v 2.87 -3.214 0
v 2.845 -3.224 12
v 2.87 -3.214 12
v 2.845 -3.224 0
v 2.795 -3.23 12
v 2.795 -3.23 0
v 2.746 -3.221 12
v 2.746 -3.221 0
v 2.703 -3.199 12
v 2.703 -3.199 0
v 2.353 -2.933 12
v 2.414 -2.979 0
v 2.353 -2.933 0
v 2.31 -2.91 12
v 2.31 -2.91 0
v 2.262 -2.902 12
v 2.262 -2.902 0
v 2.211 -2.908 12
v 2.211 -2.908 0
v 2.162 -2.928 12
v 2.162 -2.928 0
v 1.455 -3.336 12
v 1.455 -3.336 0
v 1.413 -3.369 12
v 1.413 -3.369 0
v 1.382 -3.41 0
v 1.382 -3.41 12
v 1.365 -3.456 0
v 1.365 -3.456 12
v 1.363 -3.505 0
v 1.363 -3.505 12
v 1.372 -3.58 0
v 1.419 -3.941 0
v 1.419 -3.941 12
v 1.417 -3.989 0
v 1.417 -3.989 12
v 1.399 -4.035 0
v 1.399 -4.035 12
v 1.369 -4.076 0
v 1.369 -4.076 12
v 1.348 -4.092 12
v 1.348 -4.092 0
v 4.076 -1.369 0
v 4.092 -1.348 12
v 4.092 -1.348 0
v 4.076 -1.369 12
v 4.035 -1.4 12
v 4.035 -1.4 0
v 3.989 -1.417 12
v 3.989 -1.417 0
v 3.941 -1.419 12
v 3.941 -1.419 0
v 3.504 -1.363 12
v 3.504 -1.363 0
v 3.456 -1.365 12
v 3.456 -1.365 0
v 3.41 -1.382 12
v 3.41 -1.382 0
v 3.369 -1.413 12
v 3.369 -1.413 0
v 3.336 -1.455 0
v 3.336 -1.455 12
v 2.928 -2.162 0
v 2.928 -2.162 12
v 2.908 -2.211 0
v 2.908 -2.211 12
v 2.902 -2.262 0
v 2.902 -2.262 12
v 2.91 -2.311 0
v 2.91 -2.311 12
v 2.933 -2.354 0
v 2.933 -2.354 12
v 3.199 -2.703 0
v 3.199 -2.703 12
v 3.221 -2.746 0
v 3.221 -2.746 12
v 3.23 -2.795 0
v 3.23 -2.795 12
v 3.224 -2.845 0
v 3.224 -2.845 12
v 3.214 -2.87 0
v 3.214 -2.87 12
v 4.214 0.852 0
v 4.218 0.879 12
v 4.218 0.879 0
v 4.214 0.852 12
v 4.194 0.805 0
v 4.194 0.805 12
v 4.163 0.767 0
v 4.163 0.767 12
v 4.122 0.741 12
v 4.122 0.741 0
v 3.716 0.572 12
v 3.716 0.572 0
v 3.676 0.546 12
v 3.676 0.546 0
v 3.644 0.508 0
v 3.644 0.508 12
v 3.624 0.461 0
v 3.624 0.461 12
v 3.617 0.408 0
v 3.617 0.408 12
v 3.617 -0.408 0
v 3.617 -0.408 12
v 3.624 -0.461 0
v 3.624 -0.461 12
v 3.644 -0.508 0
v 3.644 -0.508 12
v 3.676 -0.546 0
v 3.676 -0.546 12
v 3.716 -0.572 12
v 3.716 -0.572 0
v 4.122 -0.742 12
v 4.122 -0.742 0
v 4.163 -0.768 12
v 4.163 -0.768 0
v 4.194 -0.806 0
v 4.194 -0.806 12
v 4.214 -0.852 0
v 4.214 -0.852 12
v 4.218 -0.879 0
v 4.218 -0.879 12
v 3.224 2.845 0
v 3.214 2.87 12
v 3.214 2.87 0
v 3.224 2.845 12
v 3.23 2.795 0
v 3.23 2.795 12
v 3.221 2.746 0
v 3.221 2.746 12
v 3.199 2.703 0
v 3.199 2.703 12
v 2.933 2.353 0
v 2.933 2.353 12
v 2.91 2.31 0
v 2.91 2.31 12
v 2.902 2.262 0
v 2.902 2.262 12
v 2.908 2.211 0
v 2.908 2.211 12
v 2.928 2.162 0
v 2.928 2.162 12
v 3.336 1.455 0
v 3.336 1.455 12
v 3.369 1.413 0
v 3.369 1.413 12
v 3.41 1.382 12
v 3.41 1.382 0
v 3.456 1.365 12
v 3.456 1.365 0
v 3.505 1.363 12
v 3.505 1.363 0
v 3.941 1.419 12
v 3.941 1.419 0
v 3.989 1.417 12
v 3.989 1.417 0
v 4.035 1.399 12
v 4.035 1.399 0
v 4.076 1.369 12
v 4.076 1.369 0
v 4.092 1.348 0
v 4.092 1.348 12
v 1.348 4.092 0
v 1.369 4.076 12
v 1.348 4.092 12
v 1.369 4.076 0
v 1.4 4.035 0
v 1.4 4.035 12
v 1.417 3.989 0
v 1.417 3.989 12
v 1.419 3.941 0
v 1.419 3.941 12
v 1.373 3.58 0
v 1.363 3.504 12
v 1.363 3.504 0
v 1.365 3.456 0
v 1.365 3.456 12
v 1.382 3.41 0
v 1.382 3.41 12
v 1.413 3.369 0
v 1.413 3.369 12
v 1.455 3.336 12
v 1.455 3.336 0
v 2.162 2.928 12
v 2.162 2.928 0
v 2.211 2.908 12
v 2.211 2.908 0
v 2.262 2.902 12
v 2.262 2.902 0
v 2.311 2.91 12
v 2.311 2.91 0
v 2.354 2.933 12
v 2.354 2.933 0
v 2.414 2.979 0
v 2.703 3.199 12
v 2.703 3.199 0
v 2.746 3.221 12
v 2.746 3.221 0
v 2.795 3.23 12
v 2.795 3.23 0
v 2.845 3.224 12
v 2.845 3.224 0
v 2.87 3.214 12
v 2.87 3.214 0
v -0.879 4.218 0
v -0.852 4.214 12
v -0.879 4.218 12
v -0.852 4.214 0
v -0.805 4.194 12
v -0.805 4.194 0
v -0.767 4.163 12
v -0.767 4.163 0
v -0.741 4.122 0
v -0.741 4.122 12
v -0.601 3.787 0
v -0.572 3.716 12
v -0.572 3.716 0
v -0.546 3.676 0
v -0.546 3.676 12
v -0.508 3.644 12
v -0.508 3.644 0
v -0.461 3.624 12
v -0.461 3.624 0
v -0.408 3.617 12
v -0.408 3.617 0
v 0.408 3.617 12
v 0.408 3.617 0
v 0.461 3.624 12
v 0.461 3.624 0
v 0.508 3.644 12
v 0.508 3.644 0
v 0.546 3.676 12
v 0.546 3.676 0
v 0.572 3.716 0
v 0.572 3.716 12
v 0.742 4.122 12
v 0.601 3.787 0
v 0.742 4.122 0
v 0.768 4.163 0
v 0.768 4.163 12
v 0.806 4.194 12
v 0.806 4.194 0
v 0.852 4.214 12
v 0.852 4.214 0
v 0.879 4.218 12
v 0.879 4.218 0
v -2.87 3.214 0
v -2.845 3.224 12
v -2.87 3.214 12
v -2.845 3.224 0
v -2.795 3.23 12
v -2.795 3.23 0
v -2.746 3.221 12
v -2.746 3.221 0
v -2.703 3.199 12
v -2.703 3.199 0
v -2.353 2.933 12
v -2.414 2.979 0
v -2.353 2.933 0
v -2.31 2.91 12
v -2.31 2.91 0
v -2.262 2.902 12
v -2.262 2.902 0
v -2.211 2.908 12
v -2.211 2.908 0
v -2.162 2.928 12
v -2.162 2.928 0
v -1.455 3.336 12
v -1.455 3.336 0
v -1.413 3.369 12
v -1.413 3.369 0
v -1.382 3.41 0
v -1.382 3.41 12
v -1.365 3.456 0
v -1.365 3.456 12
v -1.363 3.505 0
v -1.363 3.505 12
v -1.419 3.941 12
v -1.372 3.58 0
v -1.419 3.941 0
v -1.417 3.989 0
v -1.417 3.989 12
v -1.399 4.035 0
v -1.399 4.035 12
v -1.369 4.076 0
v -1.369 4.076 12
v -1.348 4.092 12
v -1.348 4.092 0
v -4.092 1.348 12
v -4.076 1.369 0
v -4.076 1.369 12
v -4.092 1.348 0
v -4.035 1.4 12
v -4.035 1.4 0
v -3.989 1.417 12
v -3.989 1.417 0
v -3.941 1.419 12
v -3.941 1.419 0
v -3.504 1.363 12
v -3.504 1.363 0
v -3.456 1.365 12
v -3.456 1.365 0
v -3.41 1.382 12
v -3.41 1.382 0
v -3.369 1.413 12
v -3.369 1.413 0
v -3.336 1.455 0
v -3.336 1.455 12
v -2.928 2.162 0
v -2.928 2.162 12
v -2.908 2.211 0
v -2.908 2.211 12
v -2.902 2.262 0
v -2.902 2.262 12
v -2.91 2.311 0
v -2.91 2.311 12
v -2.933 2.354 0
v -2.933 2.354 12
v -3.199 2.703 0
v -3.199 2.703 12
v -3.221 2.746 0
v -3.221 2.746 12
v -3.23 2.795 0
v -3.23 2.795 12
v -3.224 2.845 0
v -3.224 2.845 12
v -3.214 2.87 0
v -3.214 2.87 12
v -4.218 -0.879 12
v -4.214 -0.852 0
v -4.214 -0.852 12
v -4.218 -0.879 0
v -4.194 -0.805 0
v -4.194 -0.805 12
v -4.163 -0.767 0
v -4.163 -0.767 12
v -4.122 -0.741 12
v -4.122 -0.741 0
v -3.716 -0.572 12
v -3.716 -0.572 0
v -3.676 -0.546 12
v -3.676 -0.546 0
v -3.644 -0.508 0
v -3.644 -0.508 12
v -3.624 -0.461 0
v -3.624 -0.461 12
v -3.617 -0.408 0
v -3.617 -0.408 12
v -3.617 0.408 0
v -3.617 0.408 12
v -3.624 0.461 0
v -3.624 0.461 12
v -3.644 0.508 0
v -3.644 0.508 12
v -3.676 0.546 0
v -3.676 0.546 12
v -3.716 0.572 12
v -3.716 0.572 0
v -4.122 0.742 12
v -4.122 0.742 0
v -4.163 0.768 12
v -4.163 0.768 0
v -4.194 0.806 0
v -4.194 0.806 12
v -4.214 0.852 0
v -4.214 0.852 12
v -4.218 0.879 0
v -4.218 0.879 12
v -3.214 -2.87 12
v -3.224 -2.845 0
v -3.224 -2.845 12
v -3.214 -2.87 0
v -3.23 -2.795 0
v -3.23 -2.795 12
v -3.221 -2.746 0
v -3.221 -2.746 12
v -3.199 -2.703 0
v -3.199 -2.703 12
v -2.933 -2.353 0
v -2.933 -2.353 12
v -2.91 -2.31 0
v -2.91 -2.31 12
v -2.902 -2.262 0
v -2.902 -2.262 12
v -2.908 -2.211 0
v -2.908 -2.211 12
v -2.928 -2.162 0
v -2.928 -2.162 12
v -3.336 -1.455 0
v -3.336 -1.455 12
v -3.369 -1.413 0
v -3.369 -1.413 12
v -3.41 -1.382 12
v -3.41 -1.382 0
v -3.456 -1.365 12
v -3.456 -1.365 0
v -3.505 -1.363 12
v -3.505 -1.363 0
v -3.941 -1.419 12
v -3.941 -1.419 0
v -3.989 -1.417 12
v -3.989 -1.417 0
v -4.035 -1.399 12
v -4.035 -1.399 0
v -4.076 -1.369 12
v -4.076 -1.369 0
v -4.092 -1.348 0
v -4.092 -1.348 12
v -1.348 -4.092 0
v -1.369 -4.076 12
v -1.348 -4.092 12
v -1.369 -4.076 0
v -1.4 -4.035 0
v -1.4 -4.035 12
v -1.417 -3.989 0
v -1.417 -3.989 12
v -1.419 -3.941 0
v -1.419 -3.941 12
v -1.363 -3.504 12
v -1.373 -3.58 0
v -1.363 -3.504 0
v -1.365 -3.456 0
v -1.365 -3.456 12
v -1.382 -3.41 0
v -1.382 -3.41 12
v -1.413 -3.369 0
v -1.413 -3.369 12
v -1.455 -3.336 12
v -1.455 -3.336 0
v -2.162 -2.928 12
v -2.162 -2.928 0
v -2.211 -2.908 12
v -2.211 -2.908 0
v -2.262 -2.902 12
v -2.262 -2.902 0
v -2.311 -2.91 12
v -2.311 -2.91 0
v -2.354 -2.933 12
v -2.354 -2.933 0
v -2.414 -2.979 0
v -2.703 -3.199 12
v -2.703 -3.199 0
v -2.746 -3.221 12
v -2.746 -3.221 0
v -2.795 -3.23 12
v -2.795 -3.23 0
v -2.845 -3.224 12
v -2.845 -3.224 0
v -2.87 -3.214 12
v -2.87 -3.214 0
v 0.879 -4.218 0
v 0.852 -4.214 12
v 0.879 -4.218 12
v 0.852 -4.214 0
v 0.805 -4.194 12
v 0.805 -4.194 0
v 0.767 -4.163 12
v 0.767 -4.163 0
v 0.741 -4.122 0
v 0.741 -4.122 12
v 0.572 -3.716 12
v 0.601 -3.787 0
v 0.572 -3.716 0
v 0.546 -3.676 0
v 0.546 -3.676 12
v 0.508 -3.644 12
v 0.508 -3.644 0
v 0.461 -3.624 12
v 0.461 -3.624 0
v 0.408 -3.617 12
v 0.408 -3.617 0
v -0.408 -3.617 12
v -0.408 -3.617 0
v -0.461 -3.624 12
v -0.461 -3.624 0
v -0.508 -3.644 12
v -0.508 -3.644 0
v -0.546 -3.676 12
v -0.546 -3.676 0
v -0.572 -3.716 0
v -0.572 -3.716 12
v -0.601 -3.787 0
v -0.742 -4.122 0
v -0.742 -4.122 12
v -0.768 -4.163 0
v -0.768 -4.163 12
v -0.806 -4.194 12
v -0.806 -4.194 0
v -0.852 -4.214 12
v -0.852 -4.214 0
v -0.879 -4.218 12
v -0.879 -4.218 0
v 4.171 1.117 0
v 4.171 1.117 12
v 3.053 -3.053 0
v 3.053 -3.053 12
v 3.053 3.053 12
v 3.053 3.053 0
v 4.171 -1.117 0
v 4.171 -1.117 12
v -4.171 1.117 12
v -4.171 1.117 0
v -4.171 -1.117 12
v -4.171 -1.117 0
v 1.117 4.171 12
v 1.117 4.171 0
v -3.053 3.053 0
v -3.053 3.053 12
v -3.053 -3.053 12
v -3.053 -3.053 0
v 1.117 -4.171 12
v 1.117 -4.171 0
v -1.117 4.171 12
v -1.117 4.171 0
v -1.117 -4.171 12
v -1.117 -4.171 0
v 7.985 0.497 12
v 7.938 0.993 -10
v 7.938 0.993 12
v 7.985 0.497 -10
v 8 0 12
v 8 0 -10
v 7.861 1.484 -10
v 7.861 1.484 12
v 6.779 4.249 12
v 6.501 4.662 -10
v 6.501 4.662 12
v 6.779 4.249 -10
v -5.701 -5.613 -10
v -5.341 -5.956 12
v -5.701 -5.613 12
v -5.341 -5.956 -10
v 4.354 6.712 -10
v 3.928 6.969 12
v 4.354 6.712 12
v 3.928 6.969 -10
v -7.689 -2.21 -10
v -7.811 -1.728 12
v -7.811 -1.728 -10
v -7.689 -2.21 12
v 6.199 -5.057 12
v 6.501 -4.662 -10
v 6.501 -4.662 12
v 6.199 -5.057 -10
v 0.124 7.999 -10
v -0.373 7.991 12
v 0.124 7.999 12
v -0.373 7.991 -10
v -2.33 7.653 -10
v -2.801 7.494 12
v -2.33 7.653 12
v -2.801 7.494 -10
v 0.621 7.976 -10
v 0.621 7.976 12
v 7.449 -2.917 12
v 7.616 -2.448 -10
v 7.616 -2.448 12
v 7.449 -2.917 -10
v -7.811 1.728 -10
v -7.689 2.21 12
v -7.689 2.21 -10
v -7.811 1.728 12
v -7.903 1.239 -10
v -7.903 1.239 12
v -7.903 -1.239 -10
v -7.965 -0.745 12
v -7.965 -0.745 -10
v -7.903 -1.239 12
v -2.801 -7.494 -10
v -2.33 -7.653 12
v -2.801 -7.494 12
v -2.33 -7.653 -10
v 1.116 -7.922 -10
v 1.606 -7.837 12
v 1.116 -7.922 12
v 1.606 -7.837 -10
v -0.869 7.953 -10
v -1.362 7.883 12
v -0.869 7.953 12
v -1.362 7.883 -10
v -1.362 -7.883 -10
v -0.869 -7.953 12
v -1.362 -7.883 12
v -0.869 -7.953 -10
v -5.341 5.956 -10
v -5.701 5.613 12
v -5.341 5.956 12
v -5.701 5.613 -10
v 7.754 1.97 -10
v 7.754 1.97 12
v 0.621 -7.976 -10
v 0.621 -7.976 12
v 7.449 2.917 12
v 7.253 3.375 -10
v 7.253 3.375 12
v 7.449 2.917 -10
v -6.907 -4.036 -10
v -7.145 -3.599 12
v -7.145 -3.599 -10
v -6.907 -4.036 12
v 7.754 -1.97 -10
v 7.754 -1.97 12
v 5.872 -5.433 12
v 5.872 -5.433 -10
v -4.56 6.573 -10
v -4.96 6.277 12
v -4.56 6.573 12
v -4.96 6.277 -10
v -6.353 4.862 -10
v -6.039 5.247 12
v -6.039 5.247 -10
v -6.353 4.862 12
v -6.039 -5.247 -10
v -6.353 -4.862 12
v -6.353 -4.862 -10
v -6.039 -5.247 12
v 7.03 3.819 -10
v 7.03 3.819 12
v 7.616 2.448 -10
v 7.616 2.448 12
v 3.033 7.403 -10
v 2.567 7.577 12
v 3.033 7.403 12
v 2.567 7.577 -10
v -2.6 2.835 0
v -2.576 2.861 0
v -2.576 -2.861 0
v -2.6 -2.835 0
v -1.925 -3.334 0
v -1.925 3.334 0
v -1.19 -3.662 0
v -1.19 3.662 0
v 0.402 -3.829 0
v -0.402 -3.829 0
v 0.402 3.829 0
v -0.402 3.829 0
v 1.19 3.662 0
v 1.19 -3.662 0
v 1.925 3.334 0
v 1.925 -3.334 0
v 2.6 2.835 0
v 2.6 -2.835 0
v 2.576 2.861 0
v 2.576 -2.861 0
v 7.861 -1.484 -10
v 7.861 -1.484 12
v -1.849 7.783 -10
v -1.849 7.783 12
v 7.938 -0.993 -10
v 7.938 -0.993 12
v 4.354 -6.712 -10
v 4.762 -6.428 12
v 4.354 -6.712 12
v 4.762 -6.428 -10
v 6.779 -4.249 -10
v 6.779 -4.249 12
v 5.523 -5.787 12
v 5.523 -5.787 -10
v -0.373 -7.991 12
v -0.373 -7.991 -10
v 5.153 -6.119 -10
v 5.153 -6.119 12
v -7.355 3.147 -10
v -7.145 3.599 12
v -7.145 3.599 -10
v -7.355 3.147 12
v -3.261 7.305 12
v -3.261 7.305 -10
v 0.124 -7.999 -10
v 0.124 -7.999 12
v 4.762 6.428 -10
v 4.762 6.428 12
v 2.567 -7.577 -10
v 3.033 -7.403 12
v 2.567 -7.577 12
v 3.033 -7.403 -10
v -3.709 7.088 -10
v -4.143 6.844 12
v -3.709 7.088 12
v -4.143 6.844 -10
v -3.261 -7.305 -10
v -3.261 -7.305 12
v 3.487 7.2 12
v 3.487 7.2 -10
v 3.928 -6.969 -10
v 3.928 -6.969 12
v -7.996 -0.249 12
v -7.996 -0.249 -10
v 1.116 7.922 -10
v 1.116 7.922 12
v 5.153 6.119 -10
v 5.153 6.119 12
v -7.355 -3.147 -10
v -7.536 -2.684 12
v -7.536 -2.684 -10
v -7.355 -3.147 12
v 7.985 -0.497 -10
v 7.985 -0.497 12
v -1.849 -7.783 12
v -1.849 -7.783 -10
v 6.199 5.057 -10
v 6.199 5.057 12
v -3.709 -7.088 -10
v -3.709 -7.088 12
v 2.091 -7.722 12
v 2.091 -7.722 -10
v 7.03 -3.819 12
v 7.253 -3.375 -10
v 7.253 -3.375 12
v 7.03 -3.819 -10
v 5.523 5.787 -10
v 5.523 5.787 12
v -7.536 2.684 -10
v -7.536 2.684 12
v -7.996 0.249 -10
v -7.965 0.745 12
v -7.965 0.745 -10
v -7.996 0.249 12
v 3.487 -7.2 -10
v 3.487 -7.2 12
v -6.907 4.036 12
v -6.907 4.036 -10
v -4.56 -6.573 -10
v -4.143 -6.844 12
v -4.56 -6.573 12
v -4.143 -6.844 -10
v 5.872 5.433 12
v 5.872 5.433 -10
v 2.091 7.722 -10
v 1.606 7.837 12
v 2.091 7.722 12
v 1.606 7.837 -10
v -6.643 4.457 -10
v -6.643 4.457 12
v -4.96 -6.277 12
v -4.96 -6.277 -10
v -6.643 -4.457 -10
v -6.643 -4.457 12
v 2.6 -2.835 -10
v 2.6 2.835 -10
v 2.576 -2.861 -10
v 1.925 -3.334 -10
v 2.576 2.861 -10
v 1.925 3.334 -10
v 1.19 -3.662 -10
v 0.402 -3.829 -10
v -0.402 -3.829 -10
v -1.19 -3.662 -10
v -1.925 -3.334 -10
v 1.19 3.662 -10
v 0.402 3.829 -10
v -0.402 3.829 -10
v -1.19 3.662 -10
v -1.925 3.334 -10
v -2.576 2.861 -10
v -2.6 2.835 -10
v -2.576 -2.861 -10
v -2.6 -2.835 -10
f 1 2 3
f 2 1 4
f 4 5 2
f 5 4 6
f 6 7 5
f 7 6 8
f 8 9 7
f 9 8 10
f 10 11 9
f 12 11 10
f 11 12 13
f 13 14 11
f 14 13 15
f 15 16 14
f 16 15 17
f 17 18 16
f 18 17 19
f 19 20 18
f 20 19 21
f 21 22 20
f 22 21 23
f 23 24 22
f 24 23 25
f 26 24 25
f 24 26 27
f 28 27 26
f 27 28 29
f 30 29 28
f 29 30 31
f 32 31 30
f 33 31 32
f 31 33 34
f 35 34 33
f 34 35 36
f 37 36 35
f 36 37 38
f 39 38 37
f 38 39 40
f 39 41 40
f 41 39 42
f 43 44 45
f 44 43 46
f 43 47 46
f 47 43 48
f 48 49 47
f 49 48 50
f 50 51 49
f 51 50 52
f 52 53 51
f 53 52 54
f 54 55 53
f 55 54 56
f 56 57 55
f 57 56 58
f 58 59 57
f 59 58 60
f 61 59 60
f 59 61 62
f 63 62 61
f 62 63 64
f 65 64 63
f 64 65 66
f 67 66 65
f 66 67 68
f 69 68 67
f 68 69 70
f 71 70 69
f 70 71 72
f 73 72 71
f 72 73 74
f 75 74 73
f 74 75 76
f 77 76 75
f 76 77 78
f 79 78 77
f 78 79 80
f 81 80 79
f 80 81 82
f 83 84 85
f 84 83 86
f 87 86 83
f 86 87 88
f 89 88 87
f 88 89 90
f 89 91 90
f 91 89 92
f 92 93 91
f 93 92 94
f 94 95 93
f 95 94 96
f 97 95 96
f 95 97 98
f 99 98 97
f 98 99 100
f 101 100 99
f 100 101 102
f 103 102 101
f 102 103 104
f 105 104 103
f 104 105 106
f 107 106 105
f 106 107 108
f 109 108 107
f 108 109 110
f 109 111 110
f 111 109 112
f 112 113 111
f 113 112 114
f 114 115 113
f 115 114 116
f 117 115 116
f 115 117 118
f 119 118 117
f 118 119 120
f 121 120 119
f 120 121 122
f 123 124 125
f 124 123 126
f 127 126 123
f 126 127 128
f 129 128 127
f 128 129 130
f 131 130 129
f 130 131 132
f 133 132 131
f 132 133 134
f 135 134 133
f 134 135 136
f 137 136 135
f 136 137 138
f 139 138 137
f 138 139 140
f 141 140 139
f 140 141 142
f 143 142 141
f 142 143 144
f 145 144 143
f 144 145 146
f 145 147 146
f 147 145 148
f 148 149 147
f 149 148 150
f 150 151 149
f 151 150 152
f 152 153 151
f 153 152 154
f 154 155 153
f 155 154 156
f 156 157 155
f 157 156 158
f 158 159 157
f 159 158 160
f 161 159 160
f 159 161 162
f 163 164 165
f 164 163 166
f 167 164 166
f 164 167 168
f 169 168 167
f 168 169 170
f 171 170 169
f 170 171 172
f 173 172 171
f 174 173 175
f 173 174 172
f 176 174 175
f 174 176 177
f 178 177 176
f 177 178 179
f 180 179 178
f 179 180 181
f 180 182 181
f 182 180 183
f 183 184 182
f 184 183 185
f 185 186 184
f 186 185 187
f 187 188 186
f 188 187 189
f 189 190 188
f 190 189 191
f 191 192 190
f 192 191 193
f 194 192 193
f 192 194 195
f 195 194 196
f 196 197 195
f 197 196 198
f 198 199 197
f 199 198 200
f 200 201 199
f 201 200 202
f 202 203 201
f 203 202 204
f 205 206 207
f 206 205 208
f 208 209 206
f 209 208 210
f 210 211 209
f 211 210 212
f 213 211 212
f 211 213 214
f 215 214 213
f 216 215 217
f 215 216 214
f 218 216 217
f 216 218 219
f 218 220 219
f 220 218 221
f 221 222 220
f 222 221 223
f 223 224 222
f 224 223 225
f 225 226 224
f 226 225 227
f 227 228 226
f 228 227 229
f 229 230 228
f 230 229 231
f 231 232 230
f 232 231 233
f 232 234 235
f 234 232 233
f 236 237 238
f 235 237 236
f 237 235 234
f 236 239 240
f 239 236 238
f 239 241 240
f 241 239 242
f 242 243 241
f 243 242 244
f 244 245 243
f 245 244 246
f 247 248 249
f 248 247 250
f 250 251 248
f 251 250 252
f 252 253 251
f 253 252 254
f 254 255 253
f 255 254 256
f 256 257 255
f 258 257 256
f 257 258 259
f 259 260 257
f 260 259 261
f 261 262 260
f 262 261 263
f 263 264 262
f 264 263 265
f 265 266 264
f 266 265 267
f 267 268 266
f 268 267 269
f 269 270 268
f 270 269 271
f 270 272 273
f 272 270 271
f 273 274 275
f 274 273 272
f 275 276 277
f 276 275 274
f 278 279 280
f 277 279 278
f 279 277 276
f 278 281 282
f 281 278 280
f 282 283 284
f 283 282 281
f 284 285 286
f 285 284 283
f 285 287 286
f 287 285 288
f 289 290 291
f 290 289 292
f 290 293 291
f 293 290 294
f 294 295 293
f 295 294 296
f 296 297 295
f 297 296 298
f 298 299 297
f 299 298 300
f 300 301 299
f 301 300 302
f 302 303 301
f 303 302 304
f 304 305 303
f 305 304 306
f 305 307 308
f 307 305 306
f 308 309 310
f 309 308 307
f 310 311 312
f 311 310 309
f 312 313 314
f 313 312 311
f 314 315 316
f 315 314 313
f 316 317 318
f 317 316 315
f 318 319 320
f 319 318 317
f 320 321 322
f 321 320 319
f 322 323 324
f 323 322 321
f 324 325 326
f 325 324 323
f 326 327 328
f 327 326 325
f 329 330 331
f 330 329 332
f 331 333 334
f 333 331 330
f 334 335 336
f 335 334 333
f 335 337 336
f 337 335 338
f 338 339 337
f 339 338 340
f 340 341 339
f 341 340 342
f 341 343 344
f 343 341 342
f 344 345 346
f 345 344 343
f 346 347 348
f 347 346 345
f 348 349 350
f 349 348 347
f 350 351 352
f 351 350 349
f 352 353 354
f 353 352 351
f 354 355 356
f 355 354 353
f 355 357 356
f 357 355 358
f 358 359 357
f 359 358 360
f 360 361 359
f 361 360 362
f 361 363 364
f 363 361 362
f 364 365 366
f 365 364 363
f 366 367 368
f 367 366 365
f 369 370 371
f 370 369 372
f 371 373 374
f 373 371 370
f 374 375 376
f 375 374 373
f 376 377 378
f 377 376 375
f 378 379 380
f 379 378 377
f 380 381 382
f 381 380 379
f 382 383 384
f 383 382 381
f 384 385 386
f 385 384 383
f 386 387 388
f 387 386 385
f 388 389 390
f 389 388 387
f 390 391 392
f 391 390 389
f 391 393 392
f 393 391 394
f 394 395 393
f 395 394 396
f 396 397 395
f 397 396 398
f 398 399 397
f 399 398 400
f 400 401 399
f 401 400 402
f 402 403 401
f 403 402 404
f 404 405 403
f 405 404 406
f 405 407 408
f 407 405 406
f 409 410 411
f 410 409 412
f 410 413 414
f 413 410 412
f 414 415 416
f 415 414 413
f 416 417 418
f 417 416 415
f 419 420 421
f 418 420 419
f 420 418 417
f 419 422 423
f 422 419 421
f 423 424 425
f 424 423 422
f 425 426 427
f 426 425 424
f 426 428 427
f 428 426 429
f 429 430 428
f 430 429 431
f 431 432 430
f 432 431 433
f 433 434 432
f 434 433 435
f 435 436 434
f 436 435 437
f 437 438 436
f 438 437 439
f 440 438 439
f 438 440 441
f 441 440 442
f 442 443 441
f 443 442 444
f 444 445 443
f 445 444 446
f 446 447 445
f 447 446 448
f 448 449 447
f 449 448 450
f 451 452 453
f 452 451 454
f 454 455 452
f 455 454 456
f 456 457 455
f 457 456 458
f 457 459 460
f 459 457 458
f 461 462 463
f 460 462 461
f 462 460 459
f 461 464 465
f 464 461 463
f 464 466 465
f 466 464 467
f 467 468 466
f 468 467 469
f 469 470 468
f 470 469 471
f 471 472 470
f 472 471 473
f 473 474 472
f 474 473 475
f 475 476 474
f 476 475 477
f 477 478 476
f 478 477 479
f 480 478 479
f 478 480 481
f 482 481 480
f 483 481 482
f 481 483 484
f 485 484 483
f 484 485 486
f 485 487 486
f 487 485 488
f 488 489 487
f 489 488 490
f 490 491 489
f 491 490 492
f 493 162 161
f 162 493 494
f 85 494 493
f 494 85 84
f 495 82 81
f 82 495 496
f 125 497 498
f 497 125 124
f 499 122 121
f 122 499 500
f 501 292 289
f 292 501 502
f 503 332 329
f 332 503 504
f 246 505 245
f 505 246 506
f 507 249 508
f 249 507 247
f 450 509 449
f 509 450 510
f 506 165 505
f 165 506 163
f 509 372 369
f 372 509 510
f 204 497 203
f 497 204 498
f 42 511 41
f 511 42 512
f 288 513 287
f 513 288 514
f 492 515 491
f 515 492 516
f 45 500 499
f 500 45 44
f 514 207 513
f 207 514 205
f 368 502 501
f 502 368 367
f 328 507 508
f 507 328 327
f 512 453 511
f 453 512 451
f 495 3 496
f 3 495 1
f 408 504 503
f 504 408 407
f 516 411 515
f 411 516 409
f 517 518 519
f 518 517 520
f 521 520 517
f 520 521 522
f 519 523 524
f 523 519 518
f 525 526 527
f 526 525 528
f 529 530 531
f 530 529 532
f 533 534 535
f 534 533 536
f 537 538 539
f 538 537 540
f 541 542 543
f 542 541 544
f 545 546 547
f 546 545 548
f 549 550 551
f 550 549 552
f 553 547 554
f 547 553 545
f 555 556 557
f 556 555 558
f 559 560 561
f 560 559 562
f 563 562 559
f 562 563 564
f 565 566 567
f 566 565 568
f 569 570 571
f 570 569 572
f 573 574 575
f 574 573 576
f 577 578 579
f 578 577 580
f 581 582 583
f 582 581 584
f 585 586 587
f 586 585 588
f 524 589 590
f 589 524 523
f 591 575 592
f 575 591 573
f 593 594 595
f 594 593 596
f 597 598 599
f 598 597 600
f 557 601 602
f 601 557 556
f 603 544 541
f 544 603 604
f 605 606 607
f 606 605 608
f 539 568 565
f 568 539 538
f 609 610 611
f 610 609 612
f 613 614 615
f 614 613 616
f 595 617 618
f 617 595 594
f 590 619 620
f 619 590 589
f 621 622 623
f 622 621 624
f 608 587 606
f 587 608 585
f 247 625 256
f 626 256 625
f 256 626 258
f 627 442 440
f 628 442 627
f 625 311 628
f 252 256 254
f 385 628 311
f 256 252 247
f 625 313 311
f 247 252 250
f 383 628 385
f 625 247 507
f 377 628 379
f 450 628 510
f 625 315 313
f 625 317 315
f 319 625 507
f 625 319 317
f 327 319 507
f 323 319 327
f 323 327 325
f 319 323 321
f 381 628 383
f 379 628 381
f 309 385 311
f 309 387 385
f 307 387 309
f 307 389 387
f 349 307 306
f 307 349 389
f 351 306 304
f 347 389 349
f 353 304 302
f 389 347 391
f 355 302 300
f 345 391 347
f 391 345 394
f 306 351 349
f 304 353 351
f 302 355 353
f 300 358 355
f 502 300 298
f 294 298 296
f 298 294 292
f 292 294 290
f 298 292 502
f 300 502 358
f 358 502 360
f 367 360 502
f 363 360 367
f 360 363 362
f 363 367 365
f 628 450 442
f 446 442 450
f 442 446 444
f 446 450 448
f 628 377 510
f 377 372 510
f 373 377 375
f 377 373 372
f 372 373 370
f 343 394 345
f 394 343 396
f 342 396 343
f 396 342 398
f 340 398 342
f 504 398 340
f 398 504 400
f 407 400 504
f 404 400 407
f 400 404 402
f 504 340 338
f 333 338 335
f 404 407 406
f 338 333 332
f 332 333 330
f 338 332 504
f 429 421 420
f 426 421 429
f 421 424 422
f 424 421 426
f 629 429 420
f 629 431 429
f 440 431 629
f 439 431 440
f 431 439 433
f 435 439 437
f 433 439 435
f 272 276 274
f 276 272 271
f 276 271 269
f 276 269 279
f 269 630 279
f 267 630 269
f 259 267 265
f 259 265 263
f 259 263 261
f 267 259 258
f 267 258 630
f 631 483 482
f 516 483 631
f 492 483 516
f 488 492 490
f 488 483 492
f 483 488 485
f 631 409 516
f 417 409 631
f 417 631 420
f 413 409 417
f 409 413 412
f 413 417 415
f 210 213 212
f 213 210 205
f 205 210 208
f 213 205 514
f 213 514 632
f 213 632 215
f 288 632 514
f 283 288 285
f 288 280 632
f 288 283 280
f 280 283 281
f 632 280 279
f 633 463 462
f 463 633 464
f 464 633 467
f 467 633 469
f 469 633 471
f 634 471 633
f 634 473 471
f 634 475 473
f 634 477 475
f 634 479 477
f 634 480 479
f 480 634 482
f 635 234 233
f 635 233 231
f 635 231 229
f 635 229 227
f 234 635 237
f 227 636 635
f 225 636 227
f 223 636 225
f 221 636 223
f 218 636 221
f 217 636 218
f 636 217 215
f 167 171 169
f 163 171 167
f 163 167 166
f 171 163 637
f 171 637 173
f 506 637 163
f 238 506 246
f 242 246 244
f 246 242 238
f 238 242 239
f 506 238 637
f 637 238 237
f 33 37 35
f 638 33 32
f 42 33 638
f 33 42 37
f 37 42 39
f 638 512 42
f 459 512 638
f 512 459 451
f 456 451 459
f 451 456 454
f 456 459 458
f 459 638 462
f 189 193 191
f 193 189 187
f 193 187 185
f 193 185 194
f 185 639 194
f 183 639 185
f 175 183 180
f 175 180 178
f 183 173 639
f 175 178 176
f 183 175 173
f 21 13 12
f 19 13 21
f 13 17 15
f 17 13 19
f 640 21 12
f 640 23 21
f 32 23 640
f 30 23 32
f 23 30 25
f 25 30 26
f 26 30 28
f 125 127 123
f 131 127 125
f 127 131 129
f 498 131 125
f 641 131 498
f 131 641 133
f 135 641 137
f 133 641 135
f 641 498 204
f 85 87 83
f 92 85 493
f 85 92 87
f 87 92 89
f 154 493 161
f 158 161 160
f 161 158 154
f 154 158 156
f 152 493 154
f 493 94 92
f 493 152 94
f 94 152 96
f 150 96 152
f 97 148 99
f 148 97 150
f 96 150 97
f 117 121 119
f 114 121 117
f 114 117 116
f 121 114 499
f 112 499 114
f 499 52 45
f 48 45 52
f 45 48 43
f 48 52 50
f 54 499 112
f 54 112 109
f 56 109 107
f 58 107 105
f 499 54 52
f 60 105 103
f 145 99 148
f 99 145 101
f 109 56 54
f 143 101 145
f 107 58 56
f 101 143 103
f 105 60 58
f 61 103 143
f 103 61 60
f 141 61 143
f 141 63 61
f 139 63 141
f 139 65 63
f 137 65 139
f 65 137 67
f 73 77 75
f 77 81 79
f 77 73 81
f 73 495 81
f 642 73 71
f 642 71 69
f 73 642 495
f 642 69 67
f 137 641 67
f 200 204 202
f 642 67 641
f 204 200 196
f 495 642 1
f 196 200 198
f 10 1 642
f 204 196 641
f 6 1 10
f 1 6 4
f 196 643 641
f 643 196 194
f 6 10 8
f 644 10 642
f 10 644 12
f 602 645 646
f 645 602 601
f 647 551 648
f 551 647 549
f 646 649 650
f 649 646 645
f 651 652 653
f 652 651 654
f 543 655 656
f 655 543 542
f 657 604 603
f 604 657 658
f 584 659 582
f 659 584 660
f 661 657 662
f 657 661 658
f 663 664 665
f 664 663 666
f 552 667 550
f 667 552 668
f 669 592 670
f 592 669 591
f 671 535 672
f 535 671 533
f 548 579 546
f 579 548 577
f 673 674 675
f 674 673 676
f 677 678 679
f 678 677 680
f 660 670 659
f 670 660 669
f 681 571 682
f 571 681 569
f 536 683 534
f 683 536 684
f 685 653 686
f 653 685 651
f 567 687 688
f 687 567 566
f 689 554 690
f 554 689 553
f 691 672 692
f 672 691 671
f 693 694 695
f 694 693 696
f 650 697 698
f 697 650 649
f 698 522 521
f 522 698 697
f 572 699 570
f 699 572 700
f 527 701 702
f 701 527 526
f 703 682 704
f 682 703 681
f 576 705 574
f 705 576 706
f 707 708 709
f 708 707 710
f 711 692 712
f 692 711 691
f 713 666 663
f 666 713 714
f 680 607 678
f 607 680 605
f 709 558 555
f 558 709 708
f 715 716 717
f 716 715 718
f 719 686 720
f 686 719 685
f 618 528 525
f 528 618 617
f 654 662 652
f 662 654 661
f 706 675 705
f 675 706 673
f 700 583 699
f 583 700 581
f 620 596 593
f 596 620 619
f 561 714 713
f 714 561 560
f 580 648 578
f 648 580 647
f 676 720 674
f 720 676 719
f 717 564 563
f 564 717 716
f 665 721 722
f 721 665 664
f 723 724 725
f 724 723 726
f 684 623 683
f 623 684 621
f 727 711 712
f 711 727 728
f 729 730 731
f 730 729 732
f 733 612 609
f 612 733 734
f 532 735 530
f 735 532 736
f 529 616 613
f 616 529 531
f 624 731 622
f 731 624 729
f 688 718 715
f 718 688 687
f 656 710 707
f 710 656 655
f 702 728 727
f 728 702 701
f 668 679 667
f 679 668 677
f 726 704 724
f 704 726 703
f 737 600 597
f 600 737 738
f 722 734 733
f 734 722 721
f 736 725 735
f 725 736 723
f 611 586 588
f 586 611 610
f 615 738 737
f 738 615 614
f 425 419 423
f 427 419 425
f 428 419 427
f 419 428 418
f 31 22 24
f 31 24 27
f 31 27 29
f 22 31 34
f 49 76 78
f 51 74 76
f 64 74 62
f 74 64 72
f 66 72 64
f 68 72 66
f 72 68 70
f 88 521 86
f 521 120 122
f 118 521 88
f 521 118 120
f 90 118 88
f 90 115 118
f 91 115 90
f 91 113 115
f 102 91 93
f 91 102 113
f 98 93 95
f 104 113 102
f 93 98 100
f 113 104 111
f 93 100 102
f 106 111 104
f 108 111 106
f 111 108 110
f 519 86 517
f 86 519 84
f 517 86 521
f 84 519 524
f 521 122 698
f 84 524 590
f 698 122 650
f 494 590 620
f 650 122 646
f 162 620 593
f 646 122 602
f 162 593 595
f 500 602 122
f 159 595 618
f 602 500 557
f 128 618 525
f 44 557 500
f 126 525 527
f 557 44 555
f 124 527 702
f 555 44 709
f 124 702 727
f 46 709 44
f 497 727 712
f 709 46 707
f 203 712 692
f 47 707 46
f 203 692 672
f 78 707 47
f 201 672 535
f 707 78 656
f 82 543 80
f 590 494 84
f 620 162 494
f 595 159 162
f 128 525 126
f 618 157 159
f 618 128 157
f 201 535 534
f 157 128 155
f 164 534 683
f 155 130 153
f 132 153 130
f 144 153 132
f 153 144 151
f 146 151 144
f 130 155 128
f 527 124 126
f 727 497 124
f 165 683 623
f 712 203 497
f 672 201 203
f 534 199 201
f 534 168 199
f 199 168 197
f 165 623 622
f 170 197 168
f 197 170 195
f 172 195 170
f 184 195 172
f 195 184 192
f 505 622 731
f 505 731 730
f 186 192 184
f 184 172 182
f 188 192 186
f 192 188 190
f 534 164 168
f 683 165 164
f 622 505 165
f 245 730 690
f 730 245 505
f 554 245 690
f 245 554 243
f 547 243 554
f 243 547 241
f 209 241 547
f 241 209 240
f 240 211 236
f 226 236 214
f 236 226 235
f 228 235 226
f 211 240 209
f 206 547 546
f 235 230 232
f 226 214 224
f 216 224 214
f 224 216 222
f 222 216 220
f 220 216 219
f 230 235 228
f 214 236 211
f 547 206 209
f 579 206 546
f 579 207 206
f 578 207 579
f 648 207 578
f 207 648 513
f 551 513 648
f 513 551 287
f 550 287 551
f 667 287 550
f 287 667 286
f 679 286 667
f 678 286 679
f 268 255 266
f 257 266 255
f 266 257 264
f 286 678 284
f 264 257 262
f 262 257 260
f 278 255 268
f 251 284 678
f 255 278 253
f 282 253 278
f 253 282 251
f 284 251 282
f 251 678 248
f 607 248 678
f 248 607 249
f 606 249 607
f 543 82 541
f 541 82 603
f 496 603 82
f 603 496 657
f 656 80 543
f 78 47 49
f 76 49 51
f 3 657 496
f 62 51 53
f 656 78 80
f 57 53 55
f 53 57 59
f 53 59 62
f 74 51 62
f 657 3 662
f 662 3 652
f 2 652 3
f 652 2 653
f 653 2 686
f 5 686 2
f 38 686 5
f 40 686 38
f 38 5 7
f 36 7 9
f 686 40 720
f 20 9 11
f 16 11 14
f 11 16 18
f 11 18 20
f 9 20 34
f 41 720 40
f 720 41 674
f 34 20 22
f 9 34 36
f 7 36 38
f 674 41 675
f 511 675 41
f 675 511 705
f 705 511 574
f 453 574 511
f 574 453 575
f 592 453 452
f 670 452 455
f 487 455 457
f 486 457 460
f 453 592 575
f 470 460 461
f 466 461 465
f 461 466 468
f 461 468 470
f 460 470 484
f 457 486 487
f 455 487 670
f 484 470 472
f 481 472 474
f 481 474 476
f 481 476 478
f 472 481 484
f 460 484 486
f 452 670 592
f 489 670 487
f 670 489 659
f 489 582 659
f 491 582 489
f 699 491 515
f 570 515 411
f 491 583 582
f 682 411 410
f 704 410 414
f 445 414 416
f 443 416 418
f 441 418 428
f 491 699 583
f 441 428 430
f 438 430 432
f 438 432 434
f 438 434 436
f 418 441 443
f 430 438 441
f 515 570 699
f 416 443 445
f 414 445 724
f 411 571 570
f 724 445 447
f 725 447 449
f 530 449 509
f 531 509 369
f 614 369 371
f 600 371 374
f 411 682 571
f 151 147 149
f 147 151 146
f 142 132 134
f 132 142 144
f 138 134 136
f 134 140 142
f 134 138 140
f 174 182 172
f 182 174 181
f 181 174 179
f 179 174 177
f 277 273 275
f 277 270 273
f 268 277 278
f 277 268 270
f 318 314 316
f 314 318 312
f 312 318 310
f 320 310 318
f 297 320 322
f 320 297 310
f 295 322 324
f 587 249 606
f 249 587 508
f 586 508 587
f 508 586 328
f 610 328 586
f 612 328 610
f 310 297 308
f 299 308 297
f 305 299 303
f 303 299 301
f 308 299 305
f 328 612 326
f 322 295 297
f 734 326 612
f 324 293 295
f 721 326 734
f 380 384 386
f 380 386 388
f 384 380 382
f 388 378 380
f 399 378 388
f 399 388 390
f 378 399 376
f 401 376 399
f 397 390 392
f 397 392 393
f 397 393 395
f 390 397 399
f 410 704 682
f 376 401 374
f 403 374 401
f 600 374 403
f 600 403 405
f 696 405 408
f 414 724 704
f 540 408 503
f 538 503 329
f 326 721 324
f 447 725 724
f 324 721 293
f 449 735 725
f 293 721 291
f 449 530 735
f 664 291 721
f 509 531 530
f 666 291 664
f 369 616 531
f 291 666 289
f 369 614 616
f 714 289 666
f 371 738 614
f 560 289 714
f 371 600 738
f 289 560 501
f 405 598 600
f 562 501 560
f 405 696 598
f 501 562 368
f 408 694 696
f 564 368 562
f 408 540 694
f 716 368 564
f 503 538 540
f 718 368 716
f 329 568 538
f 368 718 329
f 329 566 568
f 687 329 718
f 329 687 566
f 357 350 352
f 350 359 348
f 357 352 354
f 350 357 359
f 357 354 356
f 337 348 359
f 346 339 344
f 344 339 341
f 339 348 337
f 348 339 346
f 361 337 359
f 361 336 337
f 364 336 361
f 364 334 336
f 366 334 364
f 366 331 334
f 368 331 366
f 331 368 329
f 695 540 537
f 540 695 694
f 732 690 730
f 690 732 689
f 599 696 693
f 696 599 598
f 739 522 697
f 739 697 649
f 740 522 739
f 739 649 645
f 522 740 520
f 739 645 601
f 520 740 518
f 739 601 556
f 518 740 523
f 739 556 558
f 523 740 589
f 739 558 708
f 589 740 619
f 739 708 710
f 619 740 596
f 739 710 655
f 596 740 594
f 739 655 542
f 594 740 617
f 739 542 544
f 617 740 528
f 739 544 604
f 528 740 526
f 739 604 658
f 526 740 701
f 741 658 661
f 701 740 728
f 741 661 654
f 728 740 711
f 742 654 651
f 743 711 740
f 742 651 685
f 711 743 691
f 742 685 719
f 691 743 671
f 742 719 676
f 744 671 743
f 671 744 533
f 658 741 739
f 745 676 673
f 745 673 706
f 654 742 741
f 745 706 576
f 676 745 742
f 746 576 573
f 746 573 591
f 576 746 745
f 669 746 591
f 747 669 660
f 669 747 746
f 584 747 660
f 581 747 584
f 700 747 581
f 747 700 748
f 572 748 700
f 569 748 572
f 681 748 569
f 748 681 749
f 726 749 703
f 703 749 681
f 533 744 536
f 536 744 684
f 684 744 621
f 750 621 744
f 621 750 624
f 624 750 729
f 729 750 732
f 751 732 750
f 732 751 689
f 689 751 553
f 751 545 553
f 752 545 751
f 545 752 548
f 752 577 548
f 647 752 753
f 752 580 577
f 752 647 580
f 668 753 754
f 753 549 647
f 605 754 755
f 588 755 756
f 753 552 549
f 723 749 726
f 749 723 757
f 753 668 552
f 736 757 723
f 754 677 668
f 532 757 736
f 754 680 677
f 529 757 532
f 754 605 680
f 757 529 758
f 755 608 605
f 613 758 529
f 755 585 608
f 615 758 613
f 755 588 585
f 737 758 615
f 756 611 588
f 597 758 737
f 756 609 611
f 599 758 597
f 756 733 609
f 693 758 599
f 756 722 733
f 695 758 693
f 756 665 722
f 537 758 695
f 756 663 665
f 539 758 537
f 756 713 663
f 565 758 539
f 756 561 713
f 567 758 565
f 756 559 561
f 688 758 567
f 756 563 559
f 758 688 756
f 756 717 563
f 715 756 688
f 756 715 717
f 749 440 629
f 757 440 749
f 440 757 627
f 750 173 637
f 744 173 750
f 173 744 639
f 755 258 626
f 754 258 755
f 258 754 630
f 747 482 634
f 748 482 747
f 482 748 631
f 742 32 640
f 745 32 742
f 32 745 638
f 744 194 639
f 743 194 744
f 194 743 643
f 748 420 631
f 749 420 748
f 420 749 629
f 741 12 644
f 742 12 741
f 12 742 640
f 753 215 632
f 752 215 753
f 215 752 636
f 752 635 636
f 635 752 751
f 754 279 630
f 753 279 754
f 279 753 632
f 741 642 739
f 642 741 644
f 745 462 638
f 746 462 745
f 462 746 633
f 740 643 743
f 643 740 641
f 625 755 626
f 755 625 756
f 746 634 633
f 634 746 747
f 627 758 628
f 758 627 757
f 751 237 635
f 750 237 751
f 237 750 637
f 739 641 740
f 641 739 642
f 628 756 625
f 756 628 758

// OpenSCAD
// Parametric Pulley with multiple belt profiles
// by droftarts January 2012

// Based on pulleys by:
// http://www.thingiverse.com/thing:11256 by me!
// https://github.com/prusajr/PrusaMendel by Josef Prusa
// http://www.thingiverse.com/thing:3104 by GilesBathgate
// http://www.thingiverse.com/thing:2079 by nophead

// dxf tooth data from http://oem.cadregister.com/asp/PPOW_Entry.asp?company=915217&elementID=07807803/METRIC/URETH/WV0025/F
// pulley diameter checked and modelled from data at http://www.sdp-si.com/D265/HTML/D265T016.html

/**
 * @name Pulley
 * @category Printed
 * @using 1 x m3 nut, normal or nyloc
 * @using 1 x m3x10 set screw or 1 x m3x8 grub screw
 */

$fa=0.5; // default minimum facet angle is now 0.5
$fs=0.5; // default minimum facet size is now 0.5 mm



// tuneable constants

teeth = 12;			// Number of teeth, standard Mendel T5 belt = 8, gives Outside Diameter of 11.88mm
profile = 1;		// 1=MXL 2=40DP 3=XL 4=H 5=T2.5 6=T5 7=T10 8=AT5 9=HTD_3mm 10=HTD_5mm 11=HTD_8mm 12=GT2_2mm 13=GT2_3mm 14=GT2_5mm

motor_shaft = 7.7;	// NEMA17 motor shaft exact diameter = 5
m3_dia = 4;		// 3mm hole diameter
m3_nut_hex = 1;		// 1 for hex, 0 for square nut
m3_nut_flats = 8.5;	// normal M3 hex nut exact width = 5.5
m3_nut_depth = 3.2;	// normal M3 hex nut exact depth = 2.4, nyloc = 4

retainer = 0;		// Belt retainer above teeth, 0 = No, 1 = Yes
retainer_ht = 1.5;	// height of retainer flange over pulley, standard = 1.5
idler = 0;			// Belt retainer below teeth, 0 = No, 1 = Yes
idler_ht = 1.5;		// height of idler flange over pulley, standard = 1.5

pulley_t_ht = 16 - 2;	// length of toothed part of pulley, standard = 12
pulley_b_ht = 1;		// pulley base height, standard = 8. Set to same as idler_ht if you want an idler but no pulley.
pulley_b_dia = 20;	// pulley base diameter, standard = 20
no_of_nuts = 1;		// number of captive nuts required, standard = 1
nut_angle = 90;		// angle between nuts, standard = 90
nut_shaft_distance = 1.2;	// distance between inner face of nut and shaft, can be negative.


//	********************************
//	** Scaling tooth for good fit **
//	********************************
/*	To improve fit of belt to pulley, set the following constant. Decrease or increase by 0.1mm at a time. We are modelling the *BELT* tooth here, not the tooth on the pulley. Increasing the number will *decrease* the pulley tooth size. Increasing the tooth width will also scale proportionately the tooth depth, to maintain the shape of the tooth, and increase how far into the pulley the tooth is indented. Can be negative */

additional_tooth_width = 0.2; //mm

//	If you need more tooth depth than this provides, adjust the following constant. However, this will cause the shape of the tooth to change.

additional_tooth_depth = 0; //mm

// calculated constants

nut_elevation = pulley_b_ht/2;
m3_nut_points = 2*((m3_nut_flats/2)/cos(30)); // This is needed for the nut trap

// The following set the pulley diameter for a given number of teeth

MXL_pulley_dia = tooth_spacing (2.032,0.254);
40DP_pulley_dia = tooth_spacing (2.07264,0.1778);
XL_pulley_dia = tooth_spacing (5.08,0.254);
H_pulley_dia = tooth_spacing (9.525,0.381);
T2_5_pulley_dia = tooth_spaceing_curvefit (0.7467,0.796,1.026);
T5_pulley_dia = tooth_spaceing_curvefit (0.6523,1.591,1.064);
T10_pulley_dia = tooth_spacing (10,0.93);
AT5_pulley_dia = tooth_spaceing_curvefit (0.6523,1.591,1.064);
HTD_3mm_pulley_dia = tooth_spacing (3,0.381);
HTD_5mm_pulley_dia = tooth_spacing (5,0.5715);
HTD_8mm_pulley_dia = tooth_spacing (8,0.6858);
GT2_2mm_pulley_dia = tooth_spacing (2,0.254);
GT2_3mm_pulley_dia = tooth_spacing (3,0.381);
GT2_5mm_pulley_dia = tooth_spacing (5,0.5715);

// The following calls the pulley creation part, and passes the pulley diameter and tooth width to that module

/*
if ( profile == 1 ) { pulley ( "MXL" , MXL_pulley_dia , 0.508 , 1.321 ); }
if ( profile == 2 ) { pulley ( "40 D.P." , 40DP_pulley_dia , 0.457 , 1.226 ); }
if ( profile == 3 ) { pulley ( "XL" , XL_pulley_dia , 1.27, 3.051 ); }
if ( profile == 4 ) { pulley ( "H" , H_pulley_dia ,1.905 , 5.359 ); }
if ( profile == 5 ) { pulley ( "T2.5" , T2_5_pulley_dia , 0.7 , 1.678 ); }
if ( profile == 6 ) { pulley ( "T5" , T5_pulley_dia , 1.19 , 3.264 ); }
if ( profile == 7 ) { pulley ( "T10" , T10_pulley_dia , 2.5 , 6.13 ); }
if ( profile == 8 ) { pulley ( "AT5" , AT5_pulley_dia , 1.19 , 4.268 ); }
if ( profile == 9 ) { pulley ( "HTD 3mm" , HTD_3mm_pulley_dia , 1.289 , 2.27 ); }
if ( profile == 10 ) { pulley ( "HTD 5mm" , HTD_5mm_pulley_dia , 2.199 , 3.781 ); }
if ( profile == 11 ) { pulley ( "HTD 8mm" , HTD_8mm_pulley_dia , 3.607 , 6.603 ); }
if ( profile == 12 ) { pulley ( "GT2 2mm" , GT2_2mm_pulley_dia , 0.764 , 1.494 ); }
if ( profile == 13 ) { pulley ( "GT2 3mm" , GT2_3mm_pulley_dia , 1.169 , 2.31 ); }
if ( profile == 14 ) { pulley ( "GT2 5mm" , GT2_5mm_pulley_dia , 1.969 , 3.952 ); }
*/

motor_h = 10;
screw_d = 4.5;
ext_d = 16;
scale = 1.19047619047619;
motor_shaft_int = 5.1;


union() {
    difference() {
        cylinder(pulley_t_ht - 2, d = ext_d);
        scale([scale, scale, 1]) translate([0, 0, -2]) pulley("MXL", MXL_pulley_dia , 0.508 , 1.321 );
    }
    
    difference() {
        translate([0, 0, -motor_h]) cylinder(motor_h, d = ext_d);
        translate([0,0,-motor_h-1]) cylinder(d = motor_shaft, h=pulley_b_ht + pulley_t_ht + retainer_ht + 2, $fn=motor_shaft*4);
    }
    
    translate([motor_shaft - motor_shaft_int, -motor_shaft/2-1, -motor_h]) cube([motor_shaft - motor_shaft_int + 1, motor_shaft + 2, motor_h]);
    
    translate([-(motor_shaft - motor_shaft_int + 1) - (motor_shaft - motor_shaft_int), -motor_shaft/2-1, -motor_h]) cube([motor_shaft - motor_shaft_int + 1, motor_shaft + 2, motor_h]);

}
// Functions

function tooth_spaceing_curvefit (b,c,d)
	= ((c * pow(teeth,d)) / (b + pow(teeth,d))) * teeth ;

function tooth_spacing(tooth_pitch,pitch_line_offset)
	= (2*((teeth*tooth_pitch)/(3.14159265*2)-pitch_line_offset)) ;

// Main Module

module pulley( belt_type , pulley_OD , tooth_depth , tooth_width )
	{
	echo (str("Belt type = ",belt_type,"; Number of teeth = ",teeth,"; Pulley Outside Diameter = ",pulley_OD,"mm "));
	tooth_distance_from_centre = sqrt( pow(pulley_OD/2,2) - pow((tooth_width+additional_tooth_width)/2,2));
	tooth_width_scale = (tooth_width + additional_tooth_width ) / tooth_width;
	tooth_depth_scale = ((tooth_depth + additional_tooth_depth ) / tooth_depth) ;


//	************************************************************************
//	*** uncomment the following line if pulley is wider than puller base ***
//	************************************************************************

//	translate ([0,0, pulley_b_ht + pulley_t_ht + retainer_ht ]) rotate ([0,180,0])

	difference()
	 {	 
		union()
		{
			//base
	
			if ( pulley_b_ht < 2 ) { echo ("CAN'T DRAW PULLEY BASE, HEIGHT LESS THAN 2!!!"); } else {
				rotate_extrude($fn=pulley_b_dia*2)
				{
						square([pulley_b_dia/2-1,pulley_b_ht]);
						square([pulley_b_dia/2,pulley_b_ht-1]);
						translate([pulley_b_dia/2-1,pulley_b_ht-1]) circle(1);
				}
			}
	
		difference()
			{
			//shaft - diameter is outside diameter of pulley
			
			translate([0,0,pulley_b_ht]) 
			rotate ([0,0,360/(teeth*4)]) 
			cylinder(r=pulley_OD/2,h=pulley_t_ht, $fn=teeth*4);
	
			//teeth - cut out of shaft
		
			for(i=[1:teeth]) 
			rotate([0,0,i*(360/teeth)])
			translate([0,-tooth_distance_from_centre,pulley_b_ht -1]) 
			scale ([ tooth_width_scale , tooth_depth_scale , 1 ]) 
			{
			if ( profile == 1 ) { MXL();}
			if ( profile == 2 ) { 40DP();}
			if ( profile == 3 ) { XL();}
			if ( profile == 4 ) { H();}
			if ( profile == 5 ) { T2_5();}
			if ( profile == 6 ) { T5();}
			if ( profile == 7 ) { T10();}
			if ( profile == 8 ) { AT5();}
			if ( profile == 9 ) { HTD_3mm();}
			if ( profile == 10 ) { HTD_5mm();}
			if ( profile == 11 ) { HTD_8mm();}
			if ( profile == 12 ) { GT2_2mm();}
			if ( profile == 13 ) { GT2_3mm();}
			if ( profile == 14 ) { GT2_5mm();}
			}

			}
			
		//belt retainer / idler
		if ( retainer > 0 ) {translate ([0,0, pulley_b_ht + pulley_t_ht ]) 
		rotate_extrude($fn=teeth*4)  
		polygon([[0,0],[pulley_OD/2,0],[pulley_OD/2 + retainer_ht , retainer_ht],[0 , retainer_ht],[0,0]]);}
		
		if ( idler > 0 ) {translate ([0,0, pulley_b_ht - idler_ht ]) 
		rotate_extrude($fn=teeth*4)  
		polygon([[0,0],[pulley_OD/2 + idler_ht,0],[pulley_OD/2 , idler_ht],[0 , idler_ht],[0,0]]);}
	
		}
	   
		//hole for motor shaft
		//translate([0,0,-1])cylinder(r=motor_shaft/2,h=pulley_b_ht + pulley_t_ht + retainer_ht + 2,$fn=motor_shaft*4);
				
		//captive nut and grub screw holes
	
		if ( pulley_b_ht < m3_nut_flats ) { echo ("CAN'T DRAW CAPTIVE NUTS, HEIGHT LESS THAN NUT DIAMETER!!!"); } else {
		if ( (pulley_b_dia - motor_shaft)/2 < m3_nut_depth + 3 ) { echo ("CAN'T DRAW CAPTIVE NUTS, DIAMETER TOO SMALL FOR NUT DEPTH!!!"); } else {
	
			for(j=[1:no_of_nuts]) rotate([0,0,j*nut_angle])
			translate([0,0,nut_elevation])rotate([90,0,0])
	
			union()
			{
				//entrance
				translate([0,-pulley_b_ht/4-0.5,motor_shaft/2+m3_nut_depth/2+nut_shaft_distance]) cube([m3_nut_flats,pulley_b_ht/2+1,m3_nut_depth],center=true);
	
				//nut
				if ( m3_nut_hex > 0 )
					{
						// hex nut
						translate([0,0.25,motor_shaft/2+m3_nut_depth/2+nut_shaft_distance]) rotate([0,0,30]) cylinder(r=m3_nut_points/2,h=m3_nut_depth,center=true,$fn=6);
					} else {
						// square nut
						translate([0,0.25,motor_shaft/2+m3_nut_depth/2+nut_shaft_distance]) cube([m3_nut_flats,m3_nut_flats,m3_nut_depth],center=true);
					}
	
				//grub screw hole
				rotate([0,0,22.5])cylinder(r=m3_dia/2,h=pulley_b_dia/2+1,$fn=8);
			}
		}}
	 }
	   
	}


// Tooth profile modules

module MXL()
	{
	linear_extrude(height=pulley_t_ht+2) polygon([[-0.660421,-0.5],[-0.660421,0],[-0.621898,0.006033],[-0.587714,0.023037],[-0.560056,0.049424],[-0.541182,0.083609],[-0.417357,0.424392],[-0.398413,0.458752],[-0.370649,0.48514],[-0.336324,0.502074],[-0.297744,0.508035],[0.297744,0.508035],[0.336268,0.502074],[0.370452,0.48514],[0.39811,0.458752],[0.416983,0.424392],[0.540808,0.083609],[0.559752,0.049424],[0.587516,0.023037],[0.621841,0.006033],[0.660421,0],[0.660421,-0.5]]);
	}

module 40DP()
	{
	linear_extrude(height=pulley_t_ht+2) polygon([[-0.612775,-0.5],[-0.612775,0],[-0.574719,0.010187],[-0.546453,0.0381],[-0.355953,0.3683],[-0.327604,0.405408],[-0.291086,0.433388],[-0.248548,0.451049],[-0.202142,0.4572],[0.202494,0.4572],[0.248653,0.451049],[0.291042,0.433388],[0.327609,0.405408],[0.356306,0.3683],[0.546806,0.0381],[0.574499,0.010187],[0.612775,0],[0.612775,-0.5]]);
	}

module XL()
	{
	linear_extrude(height=pulley_t_ht+2) polygon([[-1.525411,-1],[-1.525411,0],[-1.41777,0.015495],[-1.320712,0.059664],[-1.239661,0.129034],[-1.180042,0.220133],[-0.793044,1.050219],[-0.733574,1.141021],[-0.652507,1.210425],[-0.555366,1.254759],[-0.447675,1.270353],[0.447675,1.270353],[0.555366,1.254759],[0.652507,1.210425],[0.733574,1.141021],[0.793044,1.050219],[1.180042,0.220133],[1.239711,0.129034],[1.320844,0.059664],[1.417919,0.015495],[1.525411,0],[1.525411,-1]]);
	}

module H()
	{
	linear_extrude(height=pulley_t_ht+2) polygon([[-2.6797,-1],[-2.6797,0],[-2.600907,0.006138],[-2.525342,0.024024],[-2.45412,0.052881],[-2.388351,0.091909],[-2.329145,0.140328],[-2.277614,0.197358],[-2.234875,0.262205],[-2.202032,0.334091],[-1.75224,1.57093],[-1.719538,1.642815],[-1.676883,1.707663],[-1.62542,1.764693],[-1.566256,1.813112],[-1.500512,1.85214],[-1.4293,1.880997],[-1.353742,1.898883],[-1.274949,1.905021],[1.275281,1.905021],[1.354056,1.898883],[1.429576,1.880997],[1.500731,1.85214],[1.566411,1.813112],[1.625508,1.764693],[1.676919,1.707663],[1.719531,1.642815],[1.752233,1.57093],[2.20273,0.334091],[2.235433,0.262205],[2.278045,0.197358],[2.329455,0.140328],[2.388553,0.091909],[2.454233,0.052881],[2.525384,0.024024],[2.600904,0.006138],[2.6797,0],[2.6797,-1]]);
	}

module T2_5()
	{
	linear_extrude(height=pulley_t_ht+2) polygon([[-0.839258,-0.5],[-0.839258,0],[-0.770246,0.021652],[-0.726369,0.079022],[-0.529167,0.620889],[-0.485025,0.67826],[-0.416278,0.699911],[0.416278,0.699911],[0.484849,0.67826],[0.528814,0.620889],[0.726369,0.079022],[0.770114,0.021652],[0.839258,0],[0.839258,-0.5]]);
	}

module T5()
	{
	linear_extrude(height=pulley_t_ht+2) polygon([[-1.632126,-0.5],[-1.632126,0],[-1.568549,0.004939],[-1.507539,0.019367],[-1.450023,0.042686],[-1.396912,0.074224],[-1.349125,0.113379],[-1.307581,0.159508],[-1.273186,0.211991],[-1.246868,0.270192],[-1.009802,0.920362],[-0.983414,0.978433],[-0.949018,1.030788],[-0.907524,1.076798],[-0.859829,1.115847],[-0.80682,1.147314],[-0.749402,1.170562],[-0.688471,1.184956],[-0.624921,1.189895],[0.624971,1.189895],[0.688622,1.184956],[0.749607,1.170562],[0.807043,1.147314],[0.860055,1.115847],[0.907754,1.076798],[0.949269,1.030788],[0.9837,0.978433],[1.010193,0.920362],[1.246907,0.270192],[1.273295,0.211991],[1.307726,0.159508],[1.349276,0.113379],[1.397039,0.074224],[1.450111,0.042686],[1.507589,0.019367],[1.568563,0.004939],[1.632126,0],[1.632126,-0.5]]);
	}

module T10()
	{
	linear_extrude(height=pulley_t_ht+2) polygon([[-3.06511,-1],[-3.06511,0],[-2.971998,0.007239],[-2.882718,0.028344],[-2.79859,0.062396],[-2.720931,0.108479],[-2.651061,0.165675],[-2.590298,0.233065],[-2.539962,0.309732],[-2.501371,0.394759],[-1.879071,2.105025],[-1.840363,2.190052],[-1.789939,2.266719],[-1.729114,2.334109],[-1.659202,2.391304],[-1.581518,2.437387],[-1.497376,2.47144],[-1.408092,2.492545],[-1.314979,2.499784],[1.314979,2.499784],[1.408091,2.492545],[1.497371,2.47144],[1.581499,2.437387],[1.659158,2.391304],[1.729028,2.334109],[1.789791,2.266719],[1.840127,2.190052],[1.878718,2.105025],[2.501018,0.394759],[2.539726,0.309732],[2.59015,0.233065],[2.650975,0.165675],[2.720887,0.108479],[2.798571,0.062396],[2.882713,0.028344],[2.971997,0.007239],[3.06511,0],[3.06511,-1]]);
	}

module AT5()
	{
	linear_extrude(height=pulley_t_ht+2) polygon([[-2.134129,-0.75],[-2.134129,0],[-2.058023,0.005488],[-1.984595,0.021547],[-1.914806,0.047569],[-1.849614,0.082947],[-1.789978,0.127073],[-1.736857,0.179338],[-1.691211,0.239136],[-1.653999,0.305859],[-1.349199,0.959203],[-1.286933,1.054635],[-1.201914,1.127346],[-1.099961,1.173664],[-0.986896,1.18992],[0.986543,1.18992],[1.099614,1.173664],[1.201605,1.127346],[1.286729,1.054635],[1.349199,0.959203],[1.653646,0.305859],[1.690859,0.239136],[1.73651,0.179338],[1.789644,0.127073],[1.849305,0.082947],[1.914539,0.047569],[1.984392,0.021547],[2.057906,0.005488],[2.134129,0],[2.134129,-0.75]]);
	}

module HTD_3mm()
	{
	linear_extrude(height=pulley_t_ht+2) polygon([[-1.135062,-0.5],[-1.135062,0],[-1.048323,0.015484],[-0.974284,0.058517],[-0.919162,0.123974],[-0.889176,0.206728],[-0.81721,0.579614],[-0.800806,0.653232],[-0.778384,0.72416],[-0.750244,0.792137],[-0.716685,0.856903],[-0.678005,0.918199],[-0.634505,0.975764],[-0.586483,1.029338],[-0.534238,1.078662],[-0.47807,1.123476],[-0.418278,1.16352],[-0.355162,1.198533],[-0.289019,1.228257],[-0.22015,1.25243],[-0.148854,1.270793],[-0.07543,1.283087],[-0.000176,1.28905],[0.075081,1.283145],[0.148515,1.270895],[0.219827,1.252561],[0.288716,1.228406],[0.354879,1.19869],[0.418018,1.163675],[0.477831,1.123623],[0.534017,1.078795],[0.586276,1.029452],[0.634307,0.975857],[0.677809,0.91827],[0.716481,0.856953],[0.750022,0.792167],[0.778133,0.724174],[0.800511,0.653236],[0.816857,0.579614],[0.888471,0.206728],[0.919014,0.123974],[0.974328,0.058517],[1.048362,0.015484],[1.135062,0],[1.135062,-0.5]]);
	}

module HTD_5mm()
	{
	linear_extrude(height=pulley_t_ht+2) polygon([[-1.89036,-0.75],[-1.89036,0],[-1.741168,0.02669],[-1.61387,0.100806],[-1.518984,0.21342],[-1.467026,0.3556],[-1.427162,0.960967],[-1.398568,1.089602],[-1.359437,1.213531],[-1.310296,1.332296],[-1.251672,1.445441],[-1.184092,1.552509],[-1.108081,1.653042],[-1.024167,1.746585],[-0.932877,1.832681],[-0.834736,1.910872],[-0.730271,1.980701],[-0.62001,2.041713],[-0.504478,2.09345],[-0.384202,2.135455],[-0.259708,2.167271],[-0.131524,2.188443],[-0.000176,2.198511],[0.131296,2.188504],[0.259588,2.167387],[0.384174,2.135616],[0.504527,2.093648],[0.620123,2.04194],[0.730433,1.980949],[0.834934,1.911132],[0.933097,1.832945],[1.024398,1.746846],[1.108311,1.653291],[1.184308,1.552736],[1.251865,1.445639],[1.310455,1.332457],[1.359552,1.213647],[1.39863,1.089664],[1.427162,0.960967],[1.467026,0.3556],[1.518984,0.21342],[1.61387,0.100806],[1.741168,0.02669],[1.89036,0],[1.89036,-0.75]]);
	}

module HTD_8mm()
	{
	linear_extrude(height=pulley_t_ht+2) polygon([[-3.301471,-1],[-3.301471,0],[-3.16611,0.012093],[-3.038062,0.047068],[-2.919646,0.10297],[-2.813182,0.177844],[-2.720989,0.269734],[-2.645387,0.376684],[-2.588694,0.496739],[-2.553229,0.627944],[-2.460801,1.470025],[-2.411413,1.691917],[-2.343887,1.905691],[-2.259126,2.110563],[-2.158035,2.30575],[-2.041518,2.490467],[-1.910478,2.66393],[-1.76582,2.825356],[-1.608446,2.973961],[-1.439261,3.10896],[-1.259169,3.22957],[-1.069074,3.335006],[-0.869878,3.424485],[-0.662487,3.497224],[-0.447804,3.552437],[-0.226732,3.589341],[-0.000176,3.607153],[0.226511,3.589461],[0.447712,3.552654],[0.66252,3.497516],[0.870027,3.424833],[1.069329,3.33539],[1.259517,3.229973],[1.439687,3.109367],[1.608931,2.974358],[1.766344,2.825731],[1.911018,2.664271],[2.042047,2.490765],[2.158526,2.305998],[2.259547,2.110755],[2.344204,1.905821],[2.411591,1.691983],[2.460801,1.470025],[2.553229,0.627944],[2.588592,0.496739],[2.645238,0.376684],[2.720834,0.269734],[2.81305,0.177844],[2.919553,0.10297],[3.038012,0.047068],[3.166095,0.012093],[3.301471,0],[3.301471,-1]]);
	}

module GT2_2mm()
	{
	linear_extrude(height=pulley_t_ht+2) polygon([[0.747183,-0.5],[0.747183,0],[0.647876,0.037218],[0.598311,0.130528],[0.578556,0.238423],[0.547158,0.343077],[0.504649,0.443762],[0.451556,0.53975],[0.358229,0.636924],[0.2484,0.707276],[0.127259,0.750044],[0,0.76447],[-0.127259,0.750044],[-0.2484,0.707276],[-0.358229,0.636924],[-0.451556,0.53975],[-0.504797,0.443762],[-0.547291,0.343077],[-0.578605,0.238423],[-0.598311,0.130528],[-0.648009,0.037218],[-0.747183,0],[-0.747183,-0.5]]);
	}

module GT2_3mm()
	{
	linear_extrude(height=pulley_t_ht+2) polygon([[-1.155171,-0.5],[-1.155171,0],[-1.065317,0.016448],[-0.989057,0.062001],[-0.93297,0.130969],[-0.90364,0.217664],[-0.863705,0.408181],[-0.800056,0.591388],[-0.713587,0.765004],[-0.60519,0.926747],[-0.469751,1.032548],[-0.320719,1.108119],[-0.162625,1.153462],[0,1.168577],[0.162625,1.153462],[0.320719,1.108119],[0.469751,1.032548],[0.60519,0.926747],[0.713587,0.765004],[0.800056,0.591388],[0.863705,0.408181],[0.90364,0.217664],[0.932921,0.130969],[0.988924,0.062001],[1.065168,0.016448],[1.155171,0],[1.155171,-0.5]]);
	}

module GT2_5mm()
	{
	linear_extrude(height=pulley_t_ht+2) polygon([[-1.975908,-0.75],[-1.975908,0],[-1.797959,0.03212],[-1.646634,0.121224],[-1.534534,0.256431],[-1.474258,0.426861],[-1.446911,0.570808],[-1.411774,0.712722],[-1.368964,0.852287],[-1.318597,0.989189],[-1.260788,1.123115],[-1.195654,1.25375],[-1.12331,1.380781],[-1.043869,1.503892],[-0.935264,1.612278],[-0.817959,1.706414],[-0.693181,1.786237],[-0.562151,1.851687],[-0.426095,1.9027],[-0.286235,1.939214],[-0.143795,1.961168],[0,1.9685],[0.143796,1.961168],[0.286235,1.939214],[0.426095,1.9027],[0.562151,1.851687],[0.693181,1.786237],[0.817959,1.706414],[0.935263,1.612278],[1.043869,1.503892],[1.123207,1.380781],[1.195509,1.25375],[1.26065,1.123115],[1.318507,0.989189],[1.368956,0.852287],[1.411872,0.712722],[1.447132,0.570808],[1.474611,0.426861],[1.534583,0.256431],[1.646678,0.121223],[1.798064,0.03212],[1.975908,0],[1.975908,-0.75]]);
	}
